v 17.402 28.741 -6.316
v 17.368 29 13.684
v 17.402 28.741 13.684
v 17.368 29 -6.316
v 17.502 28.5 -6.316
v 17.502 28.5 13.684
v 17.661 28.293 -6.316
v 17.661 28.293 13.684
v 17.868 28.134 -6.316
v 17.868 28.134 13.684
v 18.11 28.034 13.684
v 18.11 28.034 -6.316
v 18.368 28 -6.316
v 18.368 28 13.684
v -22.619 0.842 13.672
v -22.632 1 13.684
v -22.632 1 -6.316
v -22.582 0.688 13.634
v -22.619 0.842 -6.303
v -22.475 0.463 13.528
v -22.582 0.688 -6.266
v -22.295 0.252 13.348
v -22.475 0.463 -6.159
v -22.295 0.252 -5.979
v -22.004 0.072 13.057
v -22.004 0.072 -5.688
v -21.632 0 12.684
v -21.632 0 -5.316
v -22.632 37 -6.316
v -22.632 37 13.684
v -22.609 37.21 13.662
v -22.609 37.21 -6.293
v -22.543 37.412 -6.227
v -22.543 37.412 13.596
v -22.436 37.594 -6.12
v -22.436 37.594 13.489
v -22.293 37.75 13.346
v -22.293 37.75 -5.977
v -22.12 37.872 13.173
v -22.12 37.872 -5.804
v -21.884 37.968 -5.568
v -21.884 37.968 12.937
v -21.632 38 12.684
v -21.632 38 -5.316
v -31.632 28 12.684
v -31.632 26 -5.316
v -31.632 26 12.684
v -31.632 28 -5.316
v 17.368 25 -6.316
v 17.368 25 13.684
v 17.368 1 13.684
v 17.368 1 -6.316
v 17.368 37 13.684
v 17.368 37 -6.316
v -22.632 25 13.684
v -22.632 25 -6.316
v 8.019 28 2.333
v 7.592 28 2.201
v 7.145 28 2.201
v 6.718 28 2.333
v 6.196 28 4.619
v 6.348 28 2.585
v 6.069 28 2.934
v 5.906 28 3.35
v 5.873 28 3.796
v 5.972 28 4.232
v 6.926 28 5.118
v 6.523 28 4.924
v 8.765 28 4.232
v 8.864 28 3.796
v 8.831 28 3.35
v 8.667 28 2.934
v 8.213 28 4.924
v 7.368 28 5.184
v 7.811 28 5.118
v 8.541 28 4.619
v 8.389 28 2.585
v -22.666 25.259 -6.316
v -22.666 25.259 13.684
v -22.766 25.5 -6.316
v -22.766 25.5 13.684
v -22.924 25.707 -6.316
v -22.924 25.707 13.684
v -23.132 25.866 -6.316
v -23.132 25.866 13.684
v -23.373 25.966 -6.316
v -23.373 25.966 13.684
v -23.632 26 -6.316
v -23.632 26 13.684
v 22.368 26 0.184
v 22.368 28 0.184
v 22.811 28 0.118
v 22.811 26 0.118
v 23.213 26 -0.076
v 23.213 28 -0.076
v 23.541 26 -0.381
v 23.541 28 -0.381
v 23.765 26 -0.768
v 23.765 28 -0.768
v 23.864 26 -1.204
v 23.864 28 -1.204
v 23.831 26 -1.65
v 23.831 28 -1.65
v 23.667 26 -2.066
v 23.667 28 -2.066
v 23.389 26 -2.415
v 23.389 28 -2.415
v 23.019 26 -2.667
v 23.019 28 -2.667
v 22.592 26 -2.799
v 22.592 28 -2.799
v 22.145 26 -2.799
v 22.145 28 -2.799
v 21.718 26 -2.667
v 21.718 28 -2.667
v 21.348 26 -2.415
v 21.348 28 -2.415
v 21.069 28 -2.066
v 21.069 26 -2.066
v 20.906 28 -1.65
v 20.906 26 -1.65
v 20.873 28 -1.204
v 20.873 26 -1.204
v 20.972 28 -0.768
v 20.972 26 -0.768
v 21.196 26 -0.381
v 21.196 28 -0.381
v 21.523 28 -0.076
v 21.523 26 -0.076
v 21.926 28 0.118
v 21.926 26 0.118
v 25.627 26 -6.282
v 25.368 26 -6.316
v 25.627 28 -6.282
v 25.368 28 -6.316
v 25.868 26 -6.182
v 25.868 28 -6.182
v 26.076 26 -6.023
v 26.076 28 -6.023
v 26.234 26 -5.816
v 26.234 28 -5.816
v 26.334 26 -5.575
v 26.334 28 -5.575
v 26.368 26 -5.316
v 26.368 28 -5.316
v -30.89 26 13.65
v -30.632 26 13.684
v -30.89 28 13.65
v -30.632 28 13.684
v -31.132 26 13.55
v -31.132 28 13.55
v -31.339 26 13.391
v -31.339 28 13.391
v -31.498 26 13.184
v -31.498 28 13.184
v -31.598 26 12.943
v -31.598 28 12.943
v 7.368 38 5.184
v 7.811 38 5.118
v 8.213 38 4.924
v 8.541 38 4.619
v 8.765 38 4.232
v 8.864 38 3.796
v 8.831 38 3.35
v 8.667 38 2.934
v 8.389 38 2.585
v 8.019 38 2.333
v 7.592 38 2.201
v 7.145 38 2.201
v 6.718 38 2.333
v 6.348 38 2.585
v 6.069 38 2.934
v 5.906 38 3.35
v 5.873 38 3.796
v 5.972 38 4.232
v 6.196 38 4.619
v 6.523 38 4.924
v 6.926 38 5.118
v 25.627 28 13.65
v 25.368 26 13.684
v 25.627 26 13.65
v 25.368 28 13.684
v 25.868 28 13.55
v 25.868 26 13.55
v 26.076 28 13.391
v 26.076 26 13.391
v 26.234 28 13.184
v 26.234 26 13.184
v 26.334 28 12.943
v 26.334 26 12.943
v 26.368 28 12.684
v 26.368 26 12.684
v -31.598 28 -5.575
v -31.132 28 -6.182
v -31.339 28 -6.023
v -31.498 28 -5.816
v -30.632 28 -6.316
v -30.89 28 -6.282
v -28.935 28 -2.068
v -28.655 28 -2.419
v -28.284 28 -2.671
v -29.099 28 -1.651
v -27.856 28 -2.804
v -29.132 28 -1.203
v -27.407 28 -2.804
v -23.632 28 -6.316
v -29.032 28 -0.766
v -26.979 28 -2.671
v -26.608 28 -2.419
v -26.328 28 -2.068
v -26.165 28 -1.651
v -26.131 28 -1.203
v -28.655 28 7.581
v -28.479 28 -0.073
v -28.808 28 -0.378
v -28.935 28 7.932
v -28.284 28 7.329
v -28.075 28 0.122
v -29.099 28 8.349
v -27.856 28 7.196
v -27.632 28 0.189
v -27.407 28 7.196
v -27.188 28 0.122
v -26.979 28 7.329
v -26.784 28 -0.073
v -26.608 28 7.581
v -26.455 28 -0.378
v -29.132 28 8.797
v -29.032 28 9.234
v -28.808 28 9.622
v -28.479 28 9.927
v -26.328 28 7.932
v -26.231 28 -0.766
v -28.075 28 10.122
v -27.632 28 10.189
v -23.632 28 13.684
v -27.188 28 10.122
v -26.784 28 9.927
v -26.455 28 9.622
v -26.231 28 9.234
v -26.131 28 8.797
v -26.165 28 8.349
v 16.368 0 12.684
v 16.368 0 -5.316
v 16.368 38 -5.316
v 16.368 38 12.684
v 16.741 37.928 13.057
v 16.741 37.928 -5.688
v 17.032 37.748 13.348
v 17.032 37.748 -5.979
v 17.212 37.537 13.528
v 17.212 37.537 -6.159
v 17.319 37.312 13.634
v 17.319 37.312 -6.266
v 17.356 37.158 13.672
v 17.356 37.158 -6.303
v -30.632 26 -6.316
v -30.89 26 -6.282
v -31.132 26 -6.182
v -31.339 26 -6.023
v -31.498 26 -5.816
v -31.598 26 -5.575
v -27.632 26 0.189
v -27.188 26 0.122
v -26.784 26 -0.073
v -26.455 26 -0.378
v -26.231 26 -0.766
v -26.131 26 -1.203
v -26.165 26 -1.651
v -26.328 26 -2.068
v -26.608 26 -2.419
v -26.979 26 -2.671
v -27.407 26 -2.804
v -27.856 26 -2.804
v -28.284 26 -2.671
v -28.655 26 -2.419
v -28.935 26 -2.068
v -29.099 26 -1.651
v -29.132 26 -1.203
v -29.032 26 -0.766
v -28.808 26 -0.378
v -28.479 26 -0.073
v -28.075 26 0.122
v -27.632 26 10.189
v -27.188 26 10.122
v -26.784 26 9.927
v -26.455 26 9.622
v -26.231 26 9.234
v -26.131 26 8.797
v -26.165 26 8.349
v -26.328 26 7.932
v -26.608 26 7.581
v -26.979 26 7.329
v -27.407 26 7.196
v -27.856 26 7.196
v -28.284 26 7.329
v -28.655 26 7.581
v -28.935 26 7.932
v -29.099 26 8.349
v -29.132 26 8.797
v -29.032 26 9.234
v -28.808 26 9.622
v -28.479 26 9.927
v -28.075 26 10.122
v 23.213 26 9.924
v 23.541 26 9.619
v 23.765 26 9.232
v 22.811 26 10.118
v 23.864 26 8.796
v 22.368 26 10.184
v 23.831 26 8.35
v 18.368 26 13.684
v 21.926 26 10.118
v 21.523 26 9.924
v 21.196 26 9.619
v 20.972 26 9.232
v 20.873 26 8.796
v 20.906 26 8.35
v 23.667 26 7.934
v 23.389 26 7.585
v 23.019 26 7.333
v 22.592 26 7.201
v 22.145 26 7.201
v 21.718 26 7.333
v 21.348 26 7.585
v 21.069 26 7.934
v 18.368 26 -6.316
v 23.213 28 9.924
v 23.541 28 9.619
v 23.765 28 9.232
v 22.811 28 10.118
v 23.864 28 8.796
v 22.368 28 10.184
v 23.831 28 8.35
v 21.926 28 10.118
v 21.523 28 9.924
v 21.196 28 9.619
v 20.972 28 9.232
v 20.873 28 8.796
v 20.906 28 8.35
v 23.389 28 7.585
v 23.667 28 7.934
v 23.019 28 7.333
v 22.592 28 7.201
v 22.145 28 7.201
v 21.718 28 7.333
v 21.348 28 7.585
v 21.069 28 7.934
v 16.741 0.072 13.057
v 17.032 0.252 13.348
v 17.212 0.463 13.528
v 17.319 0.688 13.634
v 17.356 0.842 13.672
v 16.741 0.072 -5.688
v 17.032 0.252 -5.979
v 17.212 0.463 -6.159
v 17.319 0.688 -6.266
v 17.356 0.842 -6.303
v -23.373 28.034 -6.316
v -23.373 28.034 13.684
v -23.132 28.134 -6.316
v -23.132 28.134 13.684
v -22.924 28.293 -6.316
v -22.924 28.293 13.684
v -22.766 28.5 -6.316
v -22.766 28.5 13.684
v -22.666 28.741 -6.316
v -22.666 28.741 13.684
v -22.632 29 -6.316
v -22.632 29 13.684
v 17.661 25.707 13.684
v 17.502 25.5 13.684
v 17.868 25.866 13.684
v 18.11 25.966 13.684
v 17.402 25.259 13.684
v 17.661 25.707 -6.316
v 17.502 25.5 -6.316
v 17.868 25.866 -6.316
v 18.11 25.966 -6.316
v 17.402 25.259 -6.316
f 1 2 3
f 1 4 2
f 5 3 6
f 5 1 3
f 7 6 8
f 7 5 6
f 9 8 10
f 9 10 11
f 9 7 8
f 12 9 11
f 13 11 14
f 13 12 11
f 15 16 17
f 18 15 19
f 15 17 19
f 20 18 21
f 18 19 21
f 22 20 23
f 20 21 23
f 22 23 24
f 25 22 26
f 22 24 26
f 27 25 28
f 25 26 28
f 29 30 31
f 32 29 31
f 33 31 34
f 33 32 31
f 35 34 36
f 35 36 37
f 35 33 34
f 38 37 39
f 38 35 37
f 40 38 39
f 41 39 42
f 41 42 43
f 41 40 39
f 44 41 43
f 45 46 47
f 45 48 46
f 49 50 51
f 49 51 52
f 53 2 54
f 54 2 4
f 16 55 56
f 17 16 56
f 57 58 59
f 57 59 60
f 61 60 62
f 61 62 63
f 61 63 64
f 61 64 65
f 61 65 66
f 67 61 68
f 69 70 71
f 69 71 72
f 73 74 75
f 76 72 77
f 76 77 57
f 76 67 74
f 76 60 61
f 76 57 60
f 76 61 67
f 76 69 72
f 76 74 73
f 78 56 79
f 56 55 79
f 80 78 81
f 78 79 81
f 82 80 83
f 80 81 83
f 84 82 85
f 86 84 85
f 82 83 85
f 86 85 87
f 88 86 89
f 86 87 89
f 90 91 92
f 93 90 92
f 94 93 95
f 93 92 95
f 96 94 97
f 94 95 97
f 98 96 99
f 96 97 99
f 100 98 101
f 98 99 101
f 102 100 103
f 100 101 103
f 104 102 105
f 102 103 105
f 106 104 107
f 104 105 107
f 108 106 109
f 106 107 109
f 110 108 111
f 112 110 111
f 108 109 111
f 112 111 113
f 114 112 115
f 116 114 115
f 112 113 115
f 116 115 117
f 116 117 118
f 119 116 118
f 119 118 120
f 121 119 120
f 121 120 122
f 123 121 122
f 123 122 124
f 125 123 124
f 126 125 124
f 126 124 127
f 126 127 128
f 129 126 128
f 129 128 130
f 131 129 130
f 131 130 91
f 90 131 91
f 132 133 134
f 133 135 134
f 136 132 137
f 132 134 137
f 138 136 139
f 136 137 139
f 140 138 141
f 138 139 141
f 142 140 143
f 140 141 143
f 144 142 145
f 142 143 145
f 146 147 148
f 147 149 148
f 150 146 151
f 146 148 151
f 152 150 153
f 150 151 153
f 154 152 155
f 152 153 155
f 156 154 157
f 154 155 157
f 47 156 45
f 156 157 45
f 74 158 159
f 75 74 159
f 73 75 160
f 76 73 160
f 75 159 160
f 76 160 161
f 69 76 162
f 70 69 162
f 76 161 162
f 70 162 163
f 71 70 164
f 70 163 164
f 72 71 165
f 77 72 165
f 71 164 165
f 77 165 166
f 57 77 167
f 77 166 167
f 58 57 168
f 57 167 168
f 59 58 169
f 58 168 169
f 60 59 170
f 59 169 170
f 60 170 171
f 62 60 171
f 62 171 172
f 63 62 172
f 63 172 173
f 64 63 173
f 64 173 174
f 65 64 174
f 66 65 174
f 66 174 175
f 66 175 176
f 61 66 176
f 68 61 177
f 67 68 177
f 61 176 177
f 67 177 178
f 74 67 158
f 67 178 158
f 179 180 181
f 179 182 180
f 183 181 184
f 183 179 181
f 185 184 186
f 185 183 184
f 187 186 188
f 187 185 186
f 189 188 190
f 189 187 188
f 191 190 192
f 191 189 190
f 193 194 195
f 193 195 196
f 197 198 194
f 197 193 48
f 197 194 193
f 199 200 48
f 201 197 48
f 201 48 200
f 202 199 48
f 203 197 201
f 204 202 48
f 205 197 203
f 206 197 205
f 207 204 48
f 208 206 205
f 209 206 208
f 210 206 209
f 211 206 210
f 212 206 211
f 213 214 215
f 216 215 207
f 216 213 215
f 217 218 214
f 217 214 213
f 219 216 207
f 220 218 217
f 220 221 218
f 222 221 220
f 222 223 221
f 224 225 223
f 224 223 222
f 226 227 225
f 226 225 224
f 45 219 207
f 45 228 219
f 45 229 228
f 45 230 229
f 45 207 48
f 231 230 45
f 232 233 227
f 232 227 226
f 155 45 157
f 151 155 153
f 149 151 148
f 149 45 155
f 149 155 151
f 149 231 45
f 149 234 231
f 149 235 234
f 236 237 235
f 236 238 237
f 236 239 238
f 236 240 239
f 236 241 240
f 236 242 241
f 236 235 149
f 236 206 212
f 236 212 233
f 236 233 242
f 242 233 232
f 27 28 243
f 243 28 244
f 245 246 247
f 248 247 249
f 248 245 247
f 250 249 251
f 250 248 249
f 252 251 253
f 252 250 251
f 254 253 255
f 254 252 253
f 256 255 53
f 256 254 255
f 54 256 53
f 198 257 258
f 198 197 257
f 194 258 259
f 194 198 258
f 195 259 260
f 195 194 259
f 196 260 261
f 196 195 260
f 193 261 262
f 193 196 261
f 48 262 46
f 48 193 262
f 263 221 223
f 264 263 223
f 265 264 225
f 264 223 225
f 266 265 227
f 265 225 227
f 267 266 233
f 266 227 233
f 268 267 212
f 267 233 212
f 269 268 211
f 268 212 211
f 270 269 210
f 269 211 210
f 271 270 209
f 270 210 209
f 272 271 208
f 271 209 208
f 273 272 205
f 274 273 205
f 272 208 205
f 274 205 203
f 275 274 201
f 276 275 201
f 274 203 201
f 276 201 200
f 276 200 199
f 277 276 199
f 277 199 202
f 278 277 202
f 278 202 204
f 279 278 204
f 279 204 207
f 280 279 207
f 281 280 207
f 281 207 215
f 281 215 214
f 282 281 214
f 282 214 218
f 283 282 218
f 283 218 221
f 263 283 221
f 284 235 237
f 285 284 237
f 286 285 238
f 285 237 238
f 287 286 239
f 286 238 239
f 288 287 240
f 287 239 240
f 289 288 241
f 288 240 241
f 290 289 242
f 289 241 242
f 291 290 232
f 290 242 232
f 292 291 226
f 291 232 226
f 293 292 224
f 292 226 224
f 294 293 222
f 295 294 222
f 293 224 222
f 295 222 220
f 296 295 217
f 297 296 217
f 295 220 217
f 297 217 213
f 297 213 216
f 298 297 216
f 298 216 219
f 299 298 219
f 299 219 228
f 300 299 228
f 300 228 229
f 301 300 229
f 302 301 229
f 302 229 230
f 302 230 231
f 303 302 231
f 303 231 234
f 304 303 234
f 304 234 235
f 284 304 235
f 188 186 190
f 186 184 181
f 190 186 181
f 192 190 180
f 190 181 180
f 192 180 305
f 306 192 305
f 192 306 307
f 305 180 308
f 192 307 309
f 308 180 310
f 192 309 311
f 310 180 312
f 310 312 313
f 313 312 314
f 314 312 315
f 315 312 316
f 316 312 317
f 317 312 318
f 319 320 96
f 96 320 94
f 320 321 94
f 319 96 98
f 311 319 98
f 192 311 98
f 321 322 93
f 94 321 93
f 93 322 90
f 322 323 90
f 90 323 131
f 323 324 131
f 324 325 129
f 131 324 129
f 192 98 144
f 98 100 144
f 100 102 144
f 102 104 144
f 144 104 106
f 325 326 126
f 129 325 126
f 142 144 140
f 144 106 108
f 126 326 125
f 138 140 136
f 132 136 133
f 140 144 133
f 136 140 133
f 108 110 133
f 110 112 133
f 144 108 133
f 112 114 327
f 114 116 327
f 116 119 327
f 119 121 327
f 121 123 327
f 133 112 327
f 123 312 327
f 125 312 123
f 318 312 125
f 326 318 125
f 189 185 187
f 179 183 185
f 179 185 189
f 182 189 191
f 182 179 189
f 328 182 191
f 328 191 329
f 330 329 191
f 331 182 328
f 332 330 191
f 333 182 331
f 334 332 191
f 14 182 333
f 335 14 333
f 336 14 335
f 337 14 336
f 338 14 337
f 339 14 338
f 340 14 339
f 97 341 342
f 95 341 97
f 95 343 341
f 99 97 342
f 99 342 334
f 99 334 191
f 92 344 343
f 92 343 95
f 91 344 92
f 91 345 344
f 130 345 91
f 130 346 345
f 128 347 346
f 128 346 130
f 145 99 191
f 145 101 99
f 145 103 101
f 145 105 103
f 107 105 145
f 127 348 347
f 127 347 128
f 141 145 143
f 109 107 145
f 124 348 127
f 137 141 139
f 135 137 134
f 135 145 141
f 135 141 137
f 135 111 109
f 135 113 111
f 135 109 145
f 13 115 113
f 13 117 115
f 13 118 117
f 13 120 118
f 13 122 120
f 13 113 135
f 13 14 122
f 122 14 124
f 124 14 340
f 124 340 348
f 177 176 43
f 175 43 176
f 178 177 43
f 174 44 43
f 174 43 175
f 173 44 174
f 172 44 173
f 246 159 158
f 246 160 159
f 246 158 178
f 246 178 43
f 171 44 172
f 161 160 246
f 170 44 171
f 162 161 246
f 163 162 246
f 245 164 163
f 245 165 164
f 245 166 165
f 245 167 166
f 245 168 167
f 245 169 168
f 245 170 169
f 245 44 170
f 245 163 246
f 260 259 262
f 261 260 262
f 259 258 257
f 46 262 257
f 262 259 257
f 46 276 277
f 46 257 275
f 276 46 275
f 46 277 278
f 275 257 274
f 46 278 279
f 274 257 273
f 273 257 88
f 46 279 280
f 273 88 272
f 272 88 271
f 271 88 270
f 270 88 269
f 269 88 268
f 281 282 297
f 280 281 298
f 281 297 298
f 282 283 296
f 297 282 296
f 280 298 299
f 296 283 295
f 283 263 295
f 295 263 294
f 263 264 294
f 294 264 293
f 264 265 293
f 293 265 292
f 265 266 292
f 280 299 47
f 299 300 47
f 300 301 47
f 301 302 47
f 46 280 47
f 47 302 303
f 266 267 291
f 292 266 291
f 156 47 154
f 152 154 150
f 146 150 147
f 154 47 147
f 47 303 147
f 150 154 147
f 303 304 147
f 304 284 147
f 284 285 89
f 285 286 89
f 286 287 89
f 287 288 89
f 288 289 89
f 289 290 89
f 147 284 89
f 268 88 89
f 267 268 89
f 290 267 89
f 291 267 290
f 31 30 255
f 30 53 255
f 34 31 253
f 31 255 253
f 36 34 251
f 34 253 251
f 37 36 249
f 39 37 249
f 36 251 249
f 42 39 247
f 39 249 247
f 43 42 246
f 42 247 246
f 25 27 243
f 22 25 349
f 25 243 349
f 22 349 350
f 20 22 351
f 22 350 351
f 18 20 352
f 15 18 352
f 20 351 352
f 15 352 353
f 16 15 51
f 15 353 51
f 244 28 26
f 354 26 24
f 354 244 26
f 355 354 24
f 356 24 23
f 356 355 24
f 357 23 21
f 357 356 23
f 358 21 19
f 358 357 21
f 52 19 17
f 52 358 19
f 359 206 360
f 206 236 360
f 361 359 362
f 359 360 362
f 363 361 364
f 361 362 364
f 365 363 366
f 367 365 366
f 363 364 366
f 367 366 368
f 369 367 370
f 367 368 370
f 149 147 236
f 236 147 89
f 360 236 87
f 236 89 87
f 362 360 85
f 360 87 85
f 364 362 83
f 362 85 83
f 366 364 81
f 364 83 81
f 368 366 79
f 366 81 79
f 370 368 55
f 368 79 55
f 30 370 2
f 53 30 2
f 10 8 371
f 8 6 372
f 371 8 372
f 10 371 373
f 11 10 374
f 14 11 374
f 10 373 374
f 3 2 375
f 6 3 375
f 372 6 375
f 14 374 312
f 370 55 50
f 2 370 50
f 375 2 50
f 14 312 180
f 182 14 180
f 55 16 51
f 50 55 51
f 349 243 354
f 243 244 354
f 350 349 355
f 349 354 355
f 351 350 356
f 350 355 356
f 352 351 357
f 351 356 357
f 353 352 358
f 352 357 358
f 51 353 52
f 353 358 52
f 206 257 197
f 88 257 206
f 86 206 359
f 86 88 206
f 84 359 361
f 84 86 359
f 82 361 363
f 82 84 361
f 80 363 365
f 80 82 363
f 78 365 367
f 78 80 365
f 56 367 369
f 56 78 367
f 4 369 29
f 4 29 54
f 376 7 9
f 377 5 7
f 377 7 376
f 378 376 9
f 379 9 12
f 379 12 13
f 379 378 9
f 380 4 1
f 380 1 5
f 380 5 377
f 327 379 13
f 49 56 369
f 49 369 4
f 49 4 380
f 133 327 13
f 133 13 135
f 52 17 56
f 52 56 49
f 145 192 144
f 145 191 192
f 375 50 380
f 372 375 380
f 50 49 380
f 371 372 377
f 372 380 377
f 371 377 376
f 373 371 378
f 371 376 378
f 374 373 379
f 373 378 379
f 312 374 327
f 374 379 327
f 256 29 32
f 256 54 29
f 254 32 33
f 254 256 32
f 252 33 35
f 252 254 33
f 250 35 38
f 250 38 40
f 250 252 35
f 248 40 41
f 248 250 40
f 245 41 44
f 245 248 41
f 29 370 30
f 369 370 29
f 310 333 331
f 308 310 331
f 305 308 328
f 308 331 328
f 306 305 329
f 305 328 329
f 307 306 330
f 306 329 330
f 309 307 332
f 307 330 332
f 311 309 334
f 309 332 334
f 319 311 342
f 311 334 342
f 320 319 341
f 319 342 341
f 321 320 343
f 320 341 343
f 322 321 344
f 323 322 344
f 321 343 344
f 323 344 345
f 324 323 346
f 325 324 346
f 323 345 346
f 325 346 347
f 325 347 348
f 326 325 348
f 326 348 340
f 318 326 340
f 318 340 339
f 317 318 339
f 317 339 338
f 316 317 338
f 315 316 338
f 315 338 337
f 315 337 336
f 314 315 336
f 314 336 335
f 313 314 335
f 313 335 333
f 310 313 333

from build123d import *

# Parameters (mm, degrees)
SKETCH1_W           = 40
SKETCH1_H           = 20
BOSS_EXTRUDE1_DEPTH = 38
SKETCH2_R           = 1.5
CUT_EXTRUDE1_DEPTH  = 10
SKETCH3_W           = 20
SKETCH3_H           = 2
BOSS_EXTRUDE2_DEPTH = 9
SKETCH6_R           = 1.5
CUT_EXTRUDE2_DEPTH  = 41.82341542
SKETCH7_W           = 20
SKETCH7_H           = 2
BOSS_EXTRUDE5_DEPTH = 9
SKETCH8_R           = 1.504714294
CUT_EXTRUDE3_DEPTH  = 45.405116872
FILLET1_R           = 1


with BuildPart() as part:
    # Sketch1 → Boss-Extrude1 (new body)
    with BuildSketch(Plane(origin=(0, 0, 0), x_dir=(1, 0, 0), z_dir=(0, 1, 0))):
        with Locations((-2.631578947, -3.684210526)):
            Rectangle(SKETCH1_W, SKETCH1_H)
    extrude(amount=BOSS_EXTRUDE1_DEPTH)

    # Sketch2 → Cut-Extrude1 (cut)
    with BuildSketch(Plane(origin=(0, 38, 0), x_dir=(1, 0, 0), z_dir=(0, 1, 0))):
        with Locations(Location((7.368421053, -3.684210526, 0), (0, 0, 270))):
            Circle(SKETCH2_R)
    extrude(amount=-CUT_EXTRUDE1_DEPTH, mode=Mode.SUBTRACT)

    # Sketch3 → Boss-Extrude2 (add)
    with BuildSketch(Plane(origin=(17.368421053, 0, 0), x_dir=(0, 0, -1), z_dir=(1, 0, 0))):
        with Locations((-3.684210526, 27)):
            Rectangle(SKETCH3_W, SKETCH3_H)
    extrude(amount=BOSS_EXTRUDE2_DEPTH)

    # Sketch6 → Cut-Extrude2 (cut, through all)
    with BuildSketch(Plane(origin=(0, 28, 0), x_dir=(1, 0, 0), z_dir=(0, 1, 0))):
        with Locations(Location((22.368421053, 1.315789474, 0), (0, 0, 270))):
            Circle(SKETCH6_R)
        with Locations(Location((22.368421053, -8.684210526, 0), (0, 0, 270))):
            Circle(SKETCH6_R)
    extrude(amount=-CUT_EXTRUDE2_DEPTH, mode=Mode.SUBTRACT)

    # Sketch7 → Boss-Extrude5 (add)
    with BuildSketch(Plane.ZY.offset(22.631578947)):
        with Locations((3.684210526, 27)):
            Rectangle(SKETCH7_W, SKETCH7_H)
    extrude(amount=BOSS_EXTRUDE5_DEPTH)

    # Sketch8 → Cut-Extrude3 (cut, through all)
    with BuildSketch(Plane(origin=(0, 28, 0), x_dir=(1, 0, 0), z_dir=(0, 1, 0))):
        with Locations(Location((-27.631578947, 1.315789474, 0), (0, 0, 270))):
            Circle(SKETCH8_R)
        with Locations(Location((-27.631578947, -8.684210526, 0), (0, 0, 270))):
            Circle(SKETCH8_R)
    extrude(amount=-CUT_EXTRUDE3_DEPTH, mode=Mode.SUBTRACT)

    # Fillet1
    fillet1_edges = [part.edges().sort_by_distance(p)[0] for p in [
        (17.368421053, 38, 3.684210526),
        (-2.631578947, 38, -6.315789474),
        (17.368421053, 26, 3.684210526),
        (26.368421053, 27, 13.684210526),
        (26.368421053, 27, -6.315789474),
        (17.368421053, 28, 3.684210526),
        (-22.631578947, 38, 3.684210526),
        (-2.631578947, 0, -6.315789474),
        (17.368421053, 0, 3.684210526),
        (-22.631578947, 26, 3.684210526),
        (-31.631578947, 27, -6.315789474),
        (-31.631578947, 27, 13.684210526),
        (-22.631578947, 28, 3.684210526),
        (-2.631578947, 0, 13.684210526),
        (-22.631578947, 0, 3.684210526),
        (-2.631578947, 38, 13.684210526),
    ]]
    fillet(fillet1_edges, radius=FILLET1_R)


solid = part.part
